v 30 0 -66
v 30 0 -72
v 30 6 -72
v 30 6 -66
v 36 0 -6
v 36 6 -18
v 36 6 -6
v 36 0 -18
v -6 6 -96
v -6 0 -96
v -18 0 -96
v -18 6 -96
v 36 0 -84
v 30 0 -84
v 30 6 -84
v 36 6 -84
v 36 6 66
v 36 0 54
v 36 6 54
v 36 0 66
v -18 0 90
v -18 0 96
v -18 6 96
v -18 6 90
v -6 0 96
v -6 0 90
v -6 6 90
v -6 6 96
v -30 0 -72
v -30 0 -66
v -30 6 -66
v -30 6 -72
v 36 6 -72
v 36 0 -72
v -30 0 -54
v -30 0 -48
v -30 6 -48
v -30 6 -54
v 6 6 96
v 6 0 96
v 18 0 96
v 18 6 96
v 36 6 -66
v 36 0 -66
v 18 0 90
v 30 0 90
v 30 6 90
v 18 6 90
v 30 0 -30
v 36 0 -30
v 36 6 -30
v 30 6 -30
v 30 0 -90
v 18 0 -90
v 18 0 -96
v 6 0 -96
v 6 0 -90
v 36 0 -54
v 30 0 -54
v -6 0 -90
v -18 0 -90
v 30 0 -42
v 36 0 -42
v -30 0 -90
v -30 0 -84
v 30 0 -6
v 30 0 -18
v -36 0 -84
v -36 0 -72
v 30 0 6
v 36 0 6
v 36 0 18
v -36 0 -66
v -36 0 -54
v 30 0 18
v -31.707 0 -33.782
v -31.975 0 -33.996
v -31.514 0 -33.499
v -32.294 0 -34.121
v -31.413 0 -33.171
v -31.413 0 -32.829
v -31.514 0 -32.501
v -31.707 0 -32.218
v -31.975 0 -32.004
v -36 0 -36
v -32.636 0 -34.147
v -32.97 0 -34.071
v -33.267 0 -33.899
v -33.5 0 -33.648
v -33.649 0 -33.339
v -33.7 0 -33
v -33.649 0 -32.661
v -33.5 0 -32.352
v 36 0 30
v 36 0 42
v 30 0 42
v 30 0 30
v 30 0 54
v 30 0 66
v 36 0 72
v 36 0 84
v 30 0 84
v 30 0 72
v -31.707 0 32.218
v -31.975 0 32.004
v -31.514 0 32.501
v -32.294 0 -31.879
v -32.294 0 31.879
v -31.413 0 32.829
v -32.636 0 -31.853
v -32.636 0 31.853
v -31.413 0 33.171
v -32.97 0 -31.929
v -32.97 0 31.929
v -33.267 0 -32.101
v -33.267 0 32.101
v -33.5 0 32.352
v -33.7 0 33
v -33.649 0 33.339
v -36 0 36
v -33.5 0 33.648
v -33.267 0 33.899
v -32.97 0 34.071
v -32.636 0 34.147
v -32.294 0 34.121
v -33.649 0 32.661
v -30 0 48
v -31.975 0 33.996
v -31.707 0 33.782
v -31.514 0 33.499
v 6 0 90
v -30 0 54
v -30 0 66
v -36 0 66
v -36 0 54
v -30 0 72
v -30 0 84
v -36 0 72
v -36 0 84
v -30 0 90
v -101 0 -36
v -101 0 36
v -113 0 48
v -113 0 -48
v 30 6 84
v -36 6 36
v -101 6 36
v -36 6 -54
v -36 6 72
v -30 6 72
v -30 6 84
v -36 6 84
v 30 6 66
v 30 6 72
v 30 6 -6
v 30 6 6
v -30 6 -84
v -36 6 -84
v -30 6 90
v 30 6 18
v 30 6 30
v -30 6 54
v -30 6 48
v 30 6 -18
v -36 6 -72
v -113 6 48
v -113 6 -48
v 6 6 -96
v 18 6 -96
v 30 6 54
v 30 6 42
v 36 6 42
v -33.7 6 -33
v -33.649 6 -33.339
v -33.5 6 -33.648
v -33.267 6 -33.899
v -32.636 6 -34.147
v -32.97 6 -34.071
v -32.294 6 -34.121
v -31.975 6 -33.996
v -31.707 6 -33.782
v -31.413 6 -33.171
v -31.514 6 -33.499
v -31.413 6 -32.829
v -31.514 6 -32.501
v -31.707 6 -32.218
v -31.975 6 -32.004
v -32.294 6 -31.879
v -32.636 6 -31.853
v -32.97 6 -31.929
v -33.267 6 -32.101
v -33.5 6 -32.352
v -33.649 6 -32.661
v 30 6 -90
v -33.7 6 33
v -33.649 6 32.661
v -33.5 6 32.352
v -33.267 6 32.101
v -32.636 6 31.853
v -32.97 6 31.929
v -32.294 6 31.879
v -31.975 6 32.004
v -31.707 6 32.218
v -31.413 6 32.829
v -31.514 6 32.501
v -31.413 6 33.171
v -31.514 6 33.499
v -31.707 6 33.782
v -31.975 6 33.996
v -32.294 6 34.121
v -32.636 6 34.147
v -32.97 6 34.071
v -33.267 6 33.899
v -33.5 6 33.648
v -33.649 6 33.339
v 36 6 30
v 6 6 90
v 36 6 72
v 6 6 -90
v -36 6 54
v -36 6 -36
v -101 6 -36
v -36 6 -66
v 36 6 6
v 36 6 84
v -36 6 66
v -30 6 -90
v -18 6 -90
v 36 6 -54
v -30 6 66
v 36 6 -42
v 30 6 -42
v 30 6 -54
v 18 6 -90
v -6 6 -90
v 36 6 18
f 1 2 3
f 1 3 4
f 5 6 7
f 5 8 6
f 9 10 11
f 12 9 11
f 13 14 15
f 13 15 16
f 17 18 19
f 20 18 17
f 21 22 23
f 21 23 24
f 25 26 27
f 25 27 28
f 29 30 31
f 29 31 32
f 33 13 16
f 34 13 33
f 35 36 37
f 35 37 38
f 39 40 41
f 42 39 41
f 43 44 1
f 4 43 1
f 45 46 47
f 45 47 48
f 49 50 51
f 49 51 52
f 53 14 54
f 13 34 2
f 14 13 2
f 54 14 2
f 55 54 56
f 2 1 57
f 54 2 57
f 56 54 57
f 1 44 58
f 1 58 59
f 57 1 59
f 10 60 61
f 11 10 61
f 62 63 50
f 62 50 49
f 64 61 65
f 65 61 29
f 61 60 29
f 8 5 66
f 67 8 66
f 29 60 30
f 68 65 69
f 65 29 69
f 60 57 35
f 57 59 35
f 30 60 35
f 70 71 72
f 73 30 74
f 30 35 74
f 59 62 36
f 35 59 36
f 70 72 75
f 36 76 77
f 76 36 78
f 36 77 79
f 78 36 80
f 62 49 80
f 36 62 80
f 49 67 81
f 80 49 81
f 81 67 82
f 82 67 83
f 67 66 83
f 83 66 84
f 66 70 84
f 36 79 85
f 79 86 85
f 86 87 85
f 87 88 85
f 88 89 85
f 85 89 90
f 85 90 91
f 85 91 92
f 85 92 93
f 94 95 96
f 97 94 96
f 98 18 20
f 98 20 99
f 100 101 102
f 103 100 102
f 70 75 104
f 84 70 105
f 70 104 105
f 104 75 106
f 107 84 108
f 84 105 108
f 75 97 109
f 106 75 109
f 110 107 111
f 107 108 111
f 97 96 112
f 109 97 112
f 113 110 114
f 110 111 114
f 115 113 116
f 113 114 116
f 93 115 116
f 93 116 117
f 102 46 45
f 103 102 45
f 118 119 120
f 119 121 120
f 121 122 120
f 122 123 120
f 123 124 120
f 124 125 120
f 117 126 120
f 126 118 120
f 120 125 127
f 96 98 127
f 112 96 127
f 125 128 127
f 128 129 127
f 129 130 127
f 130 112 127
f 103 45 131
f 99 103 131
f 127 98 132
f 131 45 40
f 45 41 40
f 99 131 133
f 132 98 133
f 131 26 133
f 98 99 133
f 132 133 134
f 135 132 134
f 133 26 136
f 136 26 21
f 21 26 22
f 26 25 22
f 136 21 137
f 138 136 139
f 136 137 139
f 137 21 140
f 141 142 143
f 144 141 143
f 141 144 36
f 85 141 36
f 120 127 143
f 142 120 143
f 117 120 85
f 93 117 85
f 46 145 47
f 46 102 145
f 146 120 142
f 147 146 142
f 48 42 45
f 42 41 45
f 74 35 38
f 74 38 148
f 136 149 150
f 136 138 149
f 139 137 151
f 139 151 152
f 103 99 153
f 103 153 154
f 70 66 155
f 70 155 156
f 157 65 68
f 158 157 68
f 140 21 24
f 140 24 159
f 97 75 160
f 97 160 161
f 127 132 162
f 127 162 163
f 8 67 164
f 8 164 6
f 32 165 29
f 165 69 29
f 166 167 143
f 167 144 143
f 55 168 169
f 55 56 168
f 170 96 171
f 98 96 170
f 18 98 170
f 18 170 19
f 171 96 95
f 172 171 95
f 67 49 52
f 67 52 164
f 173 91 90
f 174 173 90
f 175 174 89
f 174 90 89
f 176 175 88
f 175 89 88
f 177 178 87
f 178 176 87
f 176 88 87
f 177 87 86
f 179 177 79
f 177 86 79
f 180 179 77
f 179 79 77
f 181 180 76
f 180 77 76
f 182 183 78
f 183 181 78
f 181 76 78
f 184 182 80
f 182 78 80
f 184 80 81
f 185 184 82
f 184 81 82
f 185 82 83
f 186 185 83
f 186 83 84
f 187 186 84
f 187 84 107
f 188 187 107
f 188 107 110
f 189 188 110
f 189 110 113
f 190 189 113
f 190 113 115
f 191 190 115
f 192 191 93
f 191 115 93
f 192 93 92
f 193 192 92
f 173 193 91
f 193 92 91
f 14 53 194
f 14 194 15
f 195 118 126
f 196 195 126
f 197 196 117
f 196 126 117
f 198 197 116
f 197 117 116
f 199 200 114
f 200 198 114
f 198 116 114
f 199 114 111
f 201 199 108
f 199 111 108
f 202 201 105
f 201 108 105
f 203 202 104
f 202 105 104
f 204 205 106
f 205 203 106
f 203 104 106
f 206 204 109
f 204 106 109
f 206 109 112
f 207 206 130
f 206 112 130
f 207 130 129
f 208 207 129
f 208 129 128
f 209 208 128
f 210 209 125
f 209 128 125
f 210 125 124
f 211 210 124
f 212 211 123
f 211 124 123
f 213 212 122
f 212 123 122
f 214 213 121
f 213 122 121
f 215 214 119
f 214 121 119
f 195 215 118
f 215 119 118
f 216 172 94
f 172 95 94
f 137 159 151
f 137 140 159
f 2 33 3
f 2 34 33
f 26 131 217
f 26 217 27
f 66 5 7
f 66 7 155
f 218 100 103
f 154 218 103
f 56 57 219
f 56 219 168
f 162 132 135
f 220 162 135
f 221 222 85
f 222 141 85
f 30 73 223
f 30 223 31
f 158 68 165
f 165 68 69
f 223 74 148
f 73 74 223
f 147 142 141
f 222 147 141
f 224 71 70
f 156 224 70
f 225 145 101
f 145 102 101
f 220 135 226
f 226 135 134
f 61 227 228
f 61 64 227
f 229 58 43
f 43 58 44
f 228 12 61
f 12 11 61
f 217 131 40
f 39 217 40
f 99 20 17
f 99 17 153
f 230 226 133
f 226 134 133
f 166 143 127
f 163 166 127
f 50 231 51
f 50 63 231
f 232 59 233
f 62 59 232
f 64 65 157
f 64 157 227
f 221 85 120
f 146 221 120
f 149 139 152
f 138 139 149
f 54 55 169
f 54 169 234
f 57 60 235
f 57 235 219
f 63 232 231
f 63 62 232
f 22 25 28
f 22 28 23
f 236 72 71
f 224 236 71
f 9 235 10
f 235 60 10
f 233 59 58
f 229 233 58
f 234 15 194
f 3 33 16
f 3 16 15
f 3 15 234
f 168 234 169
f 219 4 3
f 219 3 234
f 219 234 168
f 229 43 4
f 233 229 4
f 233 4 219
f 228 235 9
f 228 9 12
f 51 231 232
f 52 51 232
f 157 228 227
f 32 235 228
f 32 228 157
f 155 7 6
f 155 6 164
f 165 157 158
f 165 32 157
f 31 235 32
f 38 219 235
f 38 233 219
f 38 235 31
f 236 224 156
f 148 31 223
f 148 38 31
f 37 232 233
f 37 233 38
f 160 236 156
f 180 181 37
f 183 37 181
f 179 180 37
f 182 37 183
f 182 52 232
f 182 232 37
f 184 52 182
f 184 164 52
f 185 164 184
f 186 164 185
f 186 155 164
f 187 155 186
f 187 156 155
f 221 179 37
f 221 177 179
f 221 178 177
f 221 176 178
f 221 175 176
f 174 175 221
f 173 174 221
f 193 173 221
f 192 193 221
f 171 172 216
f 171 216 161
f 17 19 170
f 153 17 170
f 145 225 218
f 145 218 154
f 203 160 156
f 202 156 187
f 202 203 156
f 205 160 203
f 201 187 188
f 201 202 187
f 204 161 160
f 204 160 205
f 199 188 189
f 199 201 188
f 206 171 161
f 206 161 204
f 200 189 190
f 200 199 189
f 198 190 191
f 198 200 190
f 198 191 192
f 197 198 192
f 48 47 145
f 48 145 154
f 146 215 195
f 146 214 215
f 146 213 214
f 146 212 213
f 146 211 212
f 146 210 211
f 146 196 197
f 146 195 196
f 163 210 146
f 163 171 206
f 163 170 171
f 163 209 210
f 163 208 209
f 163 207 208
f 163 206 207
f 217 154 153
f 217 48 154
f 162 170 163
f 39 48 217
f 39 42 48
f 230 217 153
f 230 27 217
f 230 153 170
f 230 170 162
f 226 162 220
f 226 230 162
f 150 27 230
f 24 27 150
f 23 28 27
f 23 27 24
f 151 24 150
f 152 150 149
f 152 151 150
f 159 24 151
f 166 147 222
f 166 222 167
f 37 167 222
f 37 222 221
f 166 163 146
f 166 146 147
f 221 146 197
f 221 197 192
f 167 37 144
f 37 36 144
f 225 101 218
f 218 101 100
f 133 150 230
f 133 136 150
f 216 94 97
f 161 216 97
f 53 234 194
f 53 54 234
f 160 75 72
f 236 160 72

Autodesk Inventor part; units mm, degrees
ref_plane "YZ Plane" through (0, 0, 0) normal (1, 0, 0) x (0, 1, 0)
ref_plane "XZ Plane" through (0, 0, 0) normal (0, 1, 0) x (-1, 0, 0)
ref_plane "XY Plane" through (0, 0, 0) normal (0, 0, 1) x (1, 0, 0)
sketch "Sketch1" plane through (0, 0, 0) normal (0, 1, 0) x (-1, 0, 0)
  line L0 (-30, 90) -> (30, 90)
  line L1 (30, 90) -> (30, -90)
  line L2 (30, -90) -> (-30, -90)
  line L3 (-30, -90) -> (-30, 90)
  line L4 (-30, 90) -> (30, -90) construction
  line L5 (30, 90) -> (-30, -90) construction
  line L6 (-30, 84) -> (-36, 84)
  line L7 (-36, 84) -> (-36, 72)
  line L8 (-36, 72) -> (-30, 72)
  line L9 (-30, 72) -> (-30, 84)
  line L10 (-36, 66) -> (-30, 66)
  line L11 (-30, 66) -> (-30, 54)
  line L12 (-30, 54) -> (-36, 54)
  line L13 (-36, 54) -> (-36, 66)
  line L14 (-30, 42) -> (-36, 42)
  line L15 (-36, 42) -> (-36, 30)
  line L16 (-36, 30) -> (-30, 30)
  line L17 (-30, 30) -> (-30, 42)
  line L18 (-30, 18) -> (-36, 18)
  line L19 (-36, 18) -> (-36, 6)
  line L20 (-36, 6) -> (-30, 6)
  line L21 (-30, 6) -> (-30, 18)
  line L22 (0, 0) -> (-5.6352, 0)
  line L23 (-5.6352, 0) -> (0, 0)
  line L24 (0, 0) -> (0, 8.7024)
  line L25 (-30, 90) -> (30, -90) construction
  line L26 (30, 84) -> (36, 84)
  line L27 (36, 84) -> (36, 72)
  line L28 (36, 72) -> (30, 72)
  line L29 (30, 72) -> (30, 84)
  line L30 (36, 66) -> (30, 66)
  line L31 (30, 66) -> (30, 54)
  line L32 (30, 54) -> (36, 54)
  line L33 (36, 54) -> (36, 66)
  line L34 (-30, -84) -> (-36, -84)
  line L35 (-36, -84) -> (-36, -72)
  line L36 (-36, -72) -> (-30, -72)
  line L37 (-30, -72) -> (-30, -84)
  line L38 (-36, -66) -> (-30, -66)
  line L39 (-30, -66) -> (-30, -54)
  line L40 (-30, -54) -> (-36, -54)
  line L41 (-36, -54) -> (-36, -66)
  line L42 (-30, -42) -> (-36, -42)
  line L43 (-36, -42) -> (-36, -30)
  line L44 (-36, -30) -> (-30, -30)
  line L45 (-30, -30) -> (-30, -42)
  line L46 (-30, -18) -> (-36, -18)
  line L47 (-36, -18) -> (-36, -6)
  line L48 (-36, -6) -> (-30, -6)
  line L49 (-30, -6) -> (-30, -18)
  line L50 (30, -84) -> (36, -84)
  line L51 (36, -84) -> (36, -72)
  line L52 (36, -72) -> (30, -72)
  line L53 (30, -72) -> (30, -84)
  line L54 (30, -54) -> (36, -54)
  line L55 (30, -66) -> (30, -54)
  line L56 (36, -66) -> (30, -66)
  line L57 (36, -54) -> (36, -66)
  line L58 (18, 90) -> (6, 90)
  line L59 (6, 90) -> (6, 96)
  line L60 (6, 96) -> (18, 96)
  line L61 (18, 96) -> (18, 90)
  line L62 (-18, 90) -> (-6, 90)
  line L63 (-6, 90) -> (-6, 96)
  line L64 (-6, 96) -> (-18, 96)
  line L65 (-18, 96) -> (-18, 90)
  line L66 (18, -90) -> (6, -90)
  line L67 (6, -90) -> (6, -96)
  line L68 (6, -96) -> (18, -96)
  line L69 (18, -96) -> (18, -90)
  line L70 (-18, -90) -> (-6, -90)
  line L71 (-6, -90) -> (-6, -96)
  line L72 (-6, -96) -> (-18, -96)
  line L73 (-18, -96) -> (-18, -90)
  line L74 (30, -48) -> (113, -48)
  line L75 (113, -48) -> (113, 48)
  line L76 (113, 48) -> (30, 48)
  line L77 (30, 48) -> (30, -48)
  line L78 (101, -36) -> (36, -36)
  line L79 (36, -36) -> (36, 36)
  line L80 (36, 36) -> (101, 36)
  line L81 (101, 36) -> (101, -36)
  circle A0 centre (32.55, 33) radius 1.15
  circle A1 centre (32.55, -33) radius 1.15
  point P0 (0, -8.7024)
  dimension "d0" = 60
  dimension "d1" = 180
  dimension "d2" = 6
  dimension "d3" = 6
  dimension "d4" = 12
  dimension "d5" = 12
  dimension "d6" = 12
  dimension "d7" = 12
  dimension "d8" = 12
  dimension "d9" = 6
  dimension "d10" = 12
  dimension "d17" = 6
  dimension "d19" = 6
  dimension "d20" = 6
  dimension "d21" = 6
  dimension "d22" = 12
  dimension "d23" = 12
  dimension "d24" = 12
  dimension "d25" = 6
  dimension "d26" = 65
  dimension "d27" = 12
  dimension "d28" = 2.3
  dimension "d29" = 3.45
  dimension "d30" = 3
extrude "Extrusion1" add sketch "Sketch1" along normal blind 6
equation "\"d22\" = d23"
equation "\"d24\" = d23"
properties part number "case_back" material "Acrylic, Clear"
